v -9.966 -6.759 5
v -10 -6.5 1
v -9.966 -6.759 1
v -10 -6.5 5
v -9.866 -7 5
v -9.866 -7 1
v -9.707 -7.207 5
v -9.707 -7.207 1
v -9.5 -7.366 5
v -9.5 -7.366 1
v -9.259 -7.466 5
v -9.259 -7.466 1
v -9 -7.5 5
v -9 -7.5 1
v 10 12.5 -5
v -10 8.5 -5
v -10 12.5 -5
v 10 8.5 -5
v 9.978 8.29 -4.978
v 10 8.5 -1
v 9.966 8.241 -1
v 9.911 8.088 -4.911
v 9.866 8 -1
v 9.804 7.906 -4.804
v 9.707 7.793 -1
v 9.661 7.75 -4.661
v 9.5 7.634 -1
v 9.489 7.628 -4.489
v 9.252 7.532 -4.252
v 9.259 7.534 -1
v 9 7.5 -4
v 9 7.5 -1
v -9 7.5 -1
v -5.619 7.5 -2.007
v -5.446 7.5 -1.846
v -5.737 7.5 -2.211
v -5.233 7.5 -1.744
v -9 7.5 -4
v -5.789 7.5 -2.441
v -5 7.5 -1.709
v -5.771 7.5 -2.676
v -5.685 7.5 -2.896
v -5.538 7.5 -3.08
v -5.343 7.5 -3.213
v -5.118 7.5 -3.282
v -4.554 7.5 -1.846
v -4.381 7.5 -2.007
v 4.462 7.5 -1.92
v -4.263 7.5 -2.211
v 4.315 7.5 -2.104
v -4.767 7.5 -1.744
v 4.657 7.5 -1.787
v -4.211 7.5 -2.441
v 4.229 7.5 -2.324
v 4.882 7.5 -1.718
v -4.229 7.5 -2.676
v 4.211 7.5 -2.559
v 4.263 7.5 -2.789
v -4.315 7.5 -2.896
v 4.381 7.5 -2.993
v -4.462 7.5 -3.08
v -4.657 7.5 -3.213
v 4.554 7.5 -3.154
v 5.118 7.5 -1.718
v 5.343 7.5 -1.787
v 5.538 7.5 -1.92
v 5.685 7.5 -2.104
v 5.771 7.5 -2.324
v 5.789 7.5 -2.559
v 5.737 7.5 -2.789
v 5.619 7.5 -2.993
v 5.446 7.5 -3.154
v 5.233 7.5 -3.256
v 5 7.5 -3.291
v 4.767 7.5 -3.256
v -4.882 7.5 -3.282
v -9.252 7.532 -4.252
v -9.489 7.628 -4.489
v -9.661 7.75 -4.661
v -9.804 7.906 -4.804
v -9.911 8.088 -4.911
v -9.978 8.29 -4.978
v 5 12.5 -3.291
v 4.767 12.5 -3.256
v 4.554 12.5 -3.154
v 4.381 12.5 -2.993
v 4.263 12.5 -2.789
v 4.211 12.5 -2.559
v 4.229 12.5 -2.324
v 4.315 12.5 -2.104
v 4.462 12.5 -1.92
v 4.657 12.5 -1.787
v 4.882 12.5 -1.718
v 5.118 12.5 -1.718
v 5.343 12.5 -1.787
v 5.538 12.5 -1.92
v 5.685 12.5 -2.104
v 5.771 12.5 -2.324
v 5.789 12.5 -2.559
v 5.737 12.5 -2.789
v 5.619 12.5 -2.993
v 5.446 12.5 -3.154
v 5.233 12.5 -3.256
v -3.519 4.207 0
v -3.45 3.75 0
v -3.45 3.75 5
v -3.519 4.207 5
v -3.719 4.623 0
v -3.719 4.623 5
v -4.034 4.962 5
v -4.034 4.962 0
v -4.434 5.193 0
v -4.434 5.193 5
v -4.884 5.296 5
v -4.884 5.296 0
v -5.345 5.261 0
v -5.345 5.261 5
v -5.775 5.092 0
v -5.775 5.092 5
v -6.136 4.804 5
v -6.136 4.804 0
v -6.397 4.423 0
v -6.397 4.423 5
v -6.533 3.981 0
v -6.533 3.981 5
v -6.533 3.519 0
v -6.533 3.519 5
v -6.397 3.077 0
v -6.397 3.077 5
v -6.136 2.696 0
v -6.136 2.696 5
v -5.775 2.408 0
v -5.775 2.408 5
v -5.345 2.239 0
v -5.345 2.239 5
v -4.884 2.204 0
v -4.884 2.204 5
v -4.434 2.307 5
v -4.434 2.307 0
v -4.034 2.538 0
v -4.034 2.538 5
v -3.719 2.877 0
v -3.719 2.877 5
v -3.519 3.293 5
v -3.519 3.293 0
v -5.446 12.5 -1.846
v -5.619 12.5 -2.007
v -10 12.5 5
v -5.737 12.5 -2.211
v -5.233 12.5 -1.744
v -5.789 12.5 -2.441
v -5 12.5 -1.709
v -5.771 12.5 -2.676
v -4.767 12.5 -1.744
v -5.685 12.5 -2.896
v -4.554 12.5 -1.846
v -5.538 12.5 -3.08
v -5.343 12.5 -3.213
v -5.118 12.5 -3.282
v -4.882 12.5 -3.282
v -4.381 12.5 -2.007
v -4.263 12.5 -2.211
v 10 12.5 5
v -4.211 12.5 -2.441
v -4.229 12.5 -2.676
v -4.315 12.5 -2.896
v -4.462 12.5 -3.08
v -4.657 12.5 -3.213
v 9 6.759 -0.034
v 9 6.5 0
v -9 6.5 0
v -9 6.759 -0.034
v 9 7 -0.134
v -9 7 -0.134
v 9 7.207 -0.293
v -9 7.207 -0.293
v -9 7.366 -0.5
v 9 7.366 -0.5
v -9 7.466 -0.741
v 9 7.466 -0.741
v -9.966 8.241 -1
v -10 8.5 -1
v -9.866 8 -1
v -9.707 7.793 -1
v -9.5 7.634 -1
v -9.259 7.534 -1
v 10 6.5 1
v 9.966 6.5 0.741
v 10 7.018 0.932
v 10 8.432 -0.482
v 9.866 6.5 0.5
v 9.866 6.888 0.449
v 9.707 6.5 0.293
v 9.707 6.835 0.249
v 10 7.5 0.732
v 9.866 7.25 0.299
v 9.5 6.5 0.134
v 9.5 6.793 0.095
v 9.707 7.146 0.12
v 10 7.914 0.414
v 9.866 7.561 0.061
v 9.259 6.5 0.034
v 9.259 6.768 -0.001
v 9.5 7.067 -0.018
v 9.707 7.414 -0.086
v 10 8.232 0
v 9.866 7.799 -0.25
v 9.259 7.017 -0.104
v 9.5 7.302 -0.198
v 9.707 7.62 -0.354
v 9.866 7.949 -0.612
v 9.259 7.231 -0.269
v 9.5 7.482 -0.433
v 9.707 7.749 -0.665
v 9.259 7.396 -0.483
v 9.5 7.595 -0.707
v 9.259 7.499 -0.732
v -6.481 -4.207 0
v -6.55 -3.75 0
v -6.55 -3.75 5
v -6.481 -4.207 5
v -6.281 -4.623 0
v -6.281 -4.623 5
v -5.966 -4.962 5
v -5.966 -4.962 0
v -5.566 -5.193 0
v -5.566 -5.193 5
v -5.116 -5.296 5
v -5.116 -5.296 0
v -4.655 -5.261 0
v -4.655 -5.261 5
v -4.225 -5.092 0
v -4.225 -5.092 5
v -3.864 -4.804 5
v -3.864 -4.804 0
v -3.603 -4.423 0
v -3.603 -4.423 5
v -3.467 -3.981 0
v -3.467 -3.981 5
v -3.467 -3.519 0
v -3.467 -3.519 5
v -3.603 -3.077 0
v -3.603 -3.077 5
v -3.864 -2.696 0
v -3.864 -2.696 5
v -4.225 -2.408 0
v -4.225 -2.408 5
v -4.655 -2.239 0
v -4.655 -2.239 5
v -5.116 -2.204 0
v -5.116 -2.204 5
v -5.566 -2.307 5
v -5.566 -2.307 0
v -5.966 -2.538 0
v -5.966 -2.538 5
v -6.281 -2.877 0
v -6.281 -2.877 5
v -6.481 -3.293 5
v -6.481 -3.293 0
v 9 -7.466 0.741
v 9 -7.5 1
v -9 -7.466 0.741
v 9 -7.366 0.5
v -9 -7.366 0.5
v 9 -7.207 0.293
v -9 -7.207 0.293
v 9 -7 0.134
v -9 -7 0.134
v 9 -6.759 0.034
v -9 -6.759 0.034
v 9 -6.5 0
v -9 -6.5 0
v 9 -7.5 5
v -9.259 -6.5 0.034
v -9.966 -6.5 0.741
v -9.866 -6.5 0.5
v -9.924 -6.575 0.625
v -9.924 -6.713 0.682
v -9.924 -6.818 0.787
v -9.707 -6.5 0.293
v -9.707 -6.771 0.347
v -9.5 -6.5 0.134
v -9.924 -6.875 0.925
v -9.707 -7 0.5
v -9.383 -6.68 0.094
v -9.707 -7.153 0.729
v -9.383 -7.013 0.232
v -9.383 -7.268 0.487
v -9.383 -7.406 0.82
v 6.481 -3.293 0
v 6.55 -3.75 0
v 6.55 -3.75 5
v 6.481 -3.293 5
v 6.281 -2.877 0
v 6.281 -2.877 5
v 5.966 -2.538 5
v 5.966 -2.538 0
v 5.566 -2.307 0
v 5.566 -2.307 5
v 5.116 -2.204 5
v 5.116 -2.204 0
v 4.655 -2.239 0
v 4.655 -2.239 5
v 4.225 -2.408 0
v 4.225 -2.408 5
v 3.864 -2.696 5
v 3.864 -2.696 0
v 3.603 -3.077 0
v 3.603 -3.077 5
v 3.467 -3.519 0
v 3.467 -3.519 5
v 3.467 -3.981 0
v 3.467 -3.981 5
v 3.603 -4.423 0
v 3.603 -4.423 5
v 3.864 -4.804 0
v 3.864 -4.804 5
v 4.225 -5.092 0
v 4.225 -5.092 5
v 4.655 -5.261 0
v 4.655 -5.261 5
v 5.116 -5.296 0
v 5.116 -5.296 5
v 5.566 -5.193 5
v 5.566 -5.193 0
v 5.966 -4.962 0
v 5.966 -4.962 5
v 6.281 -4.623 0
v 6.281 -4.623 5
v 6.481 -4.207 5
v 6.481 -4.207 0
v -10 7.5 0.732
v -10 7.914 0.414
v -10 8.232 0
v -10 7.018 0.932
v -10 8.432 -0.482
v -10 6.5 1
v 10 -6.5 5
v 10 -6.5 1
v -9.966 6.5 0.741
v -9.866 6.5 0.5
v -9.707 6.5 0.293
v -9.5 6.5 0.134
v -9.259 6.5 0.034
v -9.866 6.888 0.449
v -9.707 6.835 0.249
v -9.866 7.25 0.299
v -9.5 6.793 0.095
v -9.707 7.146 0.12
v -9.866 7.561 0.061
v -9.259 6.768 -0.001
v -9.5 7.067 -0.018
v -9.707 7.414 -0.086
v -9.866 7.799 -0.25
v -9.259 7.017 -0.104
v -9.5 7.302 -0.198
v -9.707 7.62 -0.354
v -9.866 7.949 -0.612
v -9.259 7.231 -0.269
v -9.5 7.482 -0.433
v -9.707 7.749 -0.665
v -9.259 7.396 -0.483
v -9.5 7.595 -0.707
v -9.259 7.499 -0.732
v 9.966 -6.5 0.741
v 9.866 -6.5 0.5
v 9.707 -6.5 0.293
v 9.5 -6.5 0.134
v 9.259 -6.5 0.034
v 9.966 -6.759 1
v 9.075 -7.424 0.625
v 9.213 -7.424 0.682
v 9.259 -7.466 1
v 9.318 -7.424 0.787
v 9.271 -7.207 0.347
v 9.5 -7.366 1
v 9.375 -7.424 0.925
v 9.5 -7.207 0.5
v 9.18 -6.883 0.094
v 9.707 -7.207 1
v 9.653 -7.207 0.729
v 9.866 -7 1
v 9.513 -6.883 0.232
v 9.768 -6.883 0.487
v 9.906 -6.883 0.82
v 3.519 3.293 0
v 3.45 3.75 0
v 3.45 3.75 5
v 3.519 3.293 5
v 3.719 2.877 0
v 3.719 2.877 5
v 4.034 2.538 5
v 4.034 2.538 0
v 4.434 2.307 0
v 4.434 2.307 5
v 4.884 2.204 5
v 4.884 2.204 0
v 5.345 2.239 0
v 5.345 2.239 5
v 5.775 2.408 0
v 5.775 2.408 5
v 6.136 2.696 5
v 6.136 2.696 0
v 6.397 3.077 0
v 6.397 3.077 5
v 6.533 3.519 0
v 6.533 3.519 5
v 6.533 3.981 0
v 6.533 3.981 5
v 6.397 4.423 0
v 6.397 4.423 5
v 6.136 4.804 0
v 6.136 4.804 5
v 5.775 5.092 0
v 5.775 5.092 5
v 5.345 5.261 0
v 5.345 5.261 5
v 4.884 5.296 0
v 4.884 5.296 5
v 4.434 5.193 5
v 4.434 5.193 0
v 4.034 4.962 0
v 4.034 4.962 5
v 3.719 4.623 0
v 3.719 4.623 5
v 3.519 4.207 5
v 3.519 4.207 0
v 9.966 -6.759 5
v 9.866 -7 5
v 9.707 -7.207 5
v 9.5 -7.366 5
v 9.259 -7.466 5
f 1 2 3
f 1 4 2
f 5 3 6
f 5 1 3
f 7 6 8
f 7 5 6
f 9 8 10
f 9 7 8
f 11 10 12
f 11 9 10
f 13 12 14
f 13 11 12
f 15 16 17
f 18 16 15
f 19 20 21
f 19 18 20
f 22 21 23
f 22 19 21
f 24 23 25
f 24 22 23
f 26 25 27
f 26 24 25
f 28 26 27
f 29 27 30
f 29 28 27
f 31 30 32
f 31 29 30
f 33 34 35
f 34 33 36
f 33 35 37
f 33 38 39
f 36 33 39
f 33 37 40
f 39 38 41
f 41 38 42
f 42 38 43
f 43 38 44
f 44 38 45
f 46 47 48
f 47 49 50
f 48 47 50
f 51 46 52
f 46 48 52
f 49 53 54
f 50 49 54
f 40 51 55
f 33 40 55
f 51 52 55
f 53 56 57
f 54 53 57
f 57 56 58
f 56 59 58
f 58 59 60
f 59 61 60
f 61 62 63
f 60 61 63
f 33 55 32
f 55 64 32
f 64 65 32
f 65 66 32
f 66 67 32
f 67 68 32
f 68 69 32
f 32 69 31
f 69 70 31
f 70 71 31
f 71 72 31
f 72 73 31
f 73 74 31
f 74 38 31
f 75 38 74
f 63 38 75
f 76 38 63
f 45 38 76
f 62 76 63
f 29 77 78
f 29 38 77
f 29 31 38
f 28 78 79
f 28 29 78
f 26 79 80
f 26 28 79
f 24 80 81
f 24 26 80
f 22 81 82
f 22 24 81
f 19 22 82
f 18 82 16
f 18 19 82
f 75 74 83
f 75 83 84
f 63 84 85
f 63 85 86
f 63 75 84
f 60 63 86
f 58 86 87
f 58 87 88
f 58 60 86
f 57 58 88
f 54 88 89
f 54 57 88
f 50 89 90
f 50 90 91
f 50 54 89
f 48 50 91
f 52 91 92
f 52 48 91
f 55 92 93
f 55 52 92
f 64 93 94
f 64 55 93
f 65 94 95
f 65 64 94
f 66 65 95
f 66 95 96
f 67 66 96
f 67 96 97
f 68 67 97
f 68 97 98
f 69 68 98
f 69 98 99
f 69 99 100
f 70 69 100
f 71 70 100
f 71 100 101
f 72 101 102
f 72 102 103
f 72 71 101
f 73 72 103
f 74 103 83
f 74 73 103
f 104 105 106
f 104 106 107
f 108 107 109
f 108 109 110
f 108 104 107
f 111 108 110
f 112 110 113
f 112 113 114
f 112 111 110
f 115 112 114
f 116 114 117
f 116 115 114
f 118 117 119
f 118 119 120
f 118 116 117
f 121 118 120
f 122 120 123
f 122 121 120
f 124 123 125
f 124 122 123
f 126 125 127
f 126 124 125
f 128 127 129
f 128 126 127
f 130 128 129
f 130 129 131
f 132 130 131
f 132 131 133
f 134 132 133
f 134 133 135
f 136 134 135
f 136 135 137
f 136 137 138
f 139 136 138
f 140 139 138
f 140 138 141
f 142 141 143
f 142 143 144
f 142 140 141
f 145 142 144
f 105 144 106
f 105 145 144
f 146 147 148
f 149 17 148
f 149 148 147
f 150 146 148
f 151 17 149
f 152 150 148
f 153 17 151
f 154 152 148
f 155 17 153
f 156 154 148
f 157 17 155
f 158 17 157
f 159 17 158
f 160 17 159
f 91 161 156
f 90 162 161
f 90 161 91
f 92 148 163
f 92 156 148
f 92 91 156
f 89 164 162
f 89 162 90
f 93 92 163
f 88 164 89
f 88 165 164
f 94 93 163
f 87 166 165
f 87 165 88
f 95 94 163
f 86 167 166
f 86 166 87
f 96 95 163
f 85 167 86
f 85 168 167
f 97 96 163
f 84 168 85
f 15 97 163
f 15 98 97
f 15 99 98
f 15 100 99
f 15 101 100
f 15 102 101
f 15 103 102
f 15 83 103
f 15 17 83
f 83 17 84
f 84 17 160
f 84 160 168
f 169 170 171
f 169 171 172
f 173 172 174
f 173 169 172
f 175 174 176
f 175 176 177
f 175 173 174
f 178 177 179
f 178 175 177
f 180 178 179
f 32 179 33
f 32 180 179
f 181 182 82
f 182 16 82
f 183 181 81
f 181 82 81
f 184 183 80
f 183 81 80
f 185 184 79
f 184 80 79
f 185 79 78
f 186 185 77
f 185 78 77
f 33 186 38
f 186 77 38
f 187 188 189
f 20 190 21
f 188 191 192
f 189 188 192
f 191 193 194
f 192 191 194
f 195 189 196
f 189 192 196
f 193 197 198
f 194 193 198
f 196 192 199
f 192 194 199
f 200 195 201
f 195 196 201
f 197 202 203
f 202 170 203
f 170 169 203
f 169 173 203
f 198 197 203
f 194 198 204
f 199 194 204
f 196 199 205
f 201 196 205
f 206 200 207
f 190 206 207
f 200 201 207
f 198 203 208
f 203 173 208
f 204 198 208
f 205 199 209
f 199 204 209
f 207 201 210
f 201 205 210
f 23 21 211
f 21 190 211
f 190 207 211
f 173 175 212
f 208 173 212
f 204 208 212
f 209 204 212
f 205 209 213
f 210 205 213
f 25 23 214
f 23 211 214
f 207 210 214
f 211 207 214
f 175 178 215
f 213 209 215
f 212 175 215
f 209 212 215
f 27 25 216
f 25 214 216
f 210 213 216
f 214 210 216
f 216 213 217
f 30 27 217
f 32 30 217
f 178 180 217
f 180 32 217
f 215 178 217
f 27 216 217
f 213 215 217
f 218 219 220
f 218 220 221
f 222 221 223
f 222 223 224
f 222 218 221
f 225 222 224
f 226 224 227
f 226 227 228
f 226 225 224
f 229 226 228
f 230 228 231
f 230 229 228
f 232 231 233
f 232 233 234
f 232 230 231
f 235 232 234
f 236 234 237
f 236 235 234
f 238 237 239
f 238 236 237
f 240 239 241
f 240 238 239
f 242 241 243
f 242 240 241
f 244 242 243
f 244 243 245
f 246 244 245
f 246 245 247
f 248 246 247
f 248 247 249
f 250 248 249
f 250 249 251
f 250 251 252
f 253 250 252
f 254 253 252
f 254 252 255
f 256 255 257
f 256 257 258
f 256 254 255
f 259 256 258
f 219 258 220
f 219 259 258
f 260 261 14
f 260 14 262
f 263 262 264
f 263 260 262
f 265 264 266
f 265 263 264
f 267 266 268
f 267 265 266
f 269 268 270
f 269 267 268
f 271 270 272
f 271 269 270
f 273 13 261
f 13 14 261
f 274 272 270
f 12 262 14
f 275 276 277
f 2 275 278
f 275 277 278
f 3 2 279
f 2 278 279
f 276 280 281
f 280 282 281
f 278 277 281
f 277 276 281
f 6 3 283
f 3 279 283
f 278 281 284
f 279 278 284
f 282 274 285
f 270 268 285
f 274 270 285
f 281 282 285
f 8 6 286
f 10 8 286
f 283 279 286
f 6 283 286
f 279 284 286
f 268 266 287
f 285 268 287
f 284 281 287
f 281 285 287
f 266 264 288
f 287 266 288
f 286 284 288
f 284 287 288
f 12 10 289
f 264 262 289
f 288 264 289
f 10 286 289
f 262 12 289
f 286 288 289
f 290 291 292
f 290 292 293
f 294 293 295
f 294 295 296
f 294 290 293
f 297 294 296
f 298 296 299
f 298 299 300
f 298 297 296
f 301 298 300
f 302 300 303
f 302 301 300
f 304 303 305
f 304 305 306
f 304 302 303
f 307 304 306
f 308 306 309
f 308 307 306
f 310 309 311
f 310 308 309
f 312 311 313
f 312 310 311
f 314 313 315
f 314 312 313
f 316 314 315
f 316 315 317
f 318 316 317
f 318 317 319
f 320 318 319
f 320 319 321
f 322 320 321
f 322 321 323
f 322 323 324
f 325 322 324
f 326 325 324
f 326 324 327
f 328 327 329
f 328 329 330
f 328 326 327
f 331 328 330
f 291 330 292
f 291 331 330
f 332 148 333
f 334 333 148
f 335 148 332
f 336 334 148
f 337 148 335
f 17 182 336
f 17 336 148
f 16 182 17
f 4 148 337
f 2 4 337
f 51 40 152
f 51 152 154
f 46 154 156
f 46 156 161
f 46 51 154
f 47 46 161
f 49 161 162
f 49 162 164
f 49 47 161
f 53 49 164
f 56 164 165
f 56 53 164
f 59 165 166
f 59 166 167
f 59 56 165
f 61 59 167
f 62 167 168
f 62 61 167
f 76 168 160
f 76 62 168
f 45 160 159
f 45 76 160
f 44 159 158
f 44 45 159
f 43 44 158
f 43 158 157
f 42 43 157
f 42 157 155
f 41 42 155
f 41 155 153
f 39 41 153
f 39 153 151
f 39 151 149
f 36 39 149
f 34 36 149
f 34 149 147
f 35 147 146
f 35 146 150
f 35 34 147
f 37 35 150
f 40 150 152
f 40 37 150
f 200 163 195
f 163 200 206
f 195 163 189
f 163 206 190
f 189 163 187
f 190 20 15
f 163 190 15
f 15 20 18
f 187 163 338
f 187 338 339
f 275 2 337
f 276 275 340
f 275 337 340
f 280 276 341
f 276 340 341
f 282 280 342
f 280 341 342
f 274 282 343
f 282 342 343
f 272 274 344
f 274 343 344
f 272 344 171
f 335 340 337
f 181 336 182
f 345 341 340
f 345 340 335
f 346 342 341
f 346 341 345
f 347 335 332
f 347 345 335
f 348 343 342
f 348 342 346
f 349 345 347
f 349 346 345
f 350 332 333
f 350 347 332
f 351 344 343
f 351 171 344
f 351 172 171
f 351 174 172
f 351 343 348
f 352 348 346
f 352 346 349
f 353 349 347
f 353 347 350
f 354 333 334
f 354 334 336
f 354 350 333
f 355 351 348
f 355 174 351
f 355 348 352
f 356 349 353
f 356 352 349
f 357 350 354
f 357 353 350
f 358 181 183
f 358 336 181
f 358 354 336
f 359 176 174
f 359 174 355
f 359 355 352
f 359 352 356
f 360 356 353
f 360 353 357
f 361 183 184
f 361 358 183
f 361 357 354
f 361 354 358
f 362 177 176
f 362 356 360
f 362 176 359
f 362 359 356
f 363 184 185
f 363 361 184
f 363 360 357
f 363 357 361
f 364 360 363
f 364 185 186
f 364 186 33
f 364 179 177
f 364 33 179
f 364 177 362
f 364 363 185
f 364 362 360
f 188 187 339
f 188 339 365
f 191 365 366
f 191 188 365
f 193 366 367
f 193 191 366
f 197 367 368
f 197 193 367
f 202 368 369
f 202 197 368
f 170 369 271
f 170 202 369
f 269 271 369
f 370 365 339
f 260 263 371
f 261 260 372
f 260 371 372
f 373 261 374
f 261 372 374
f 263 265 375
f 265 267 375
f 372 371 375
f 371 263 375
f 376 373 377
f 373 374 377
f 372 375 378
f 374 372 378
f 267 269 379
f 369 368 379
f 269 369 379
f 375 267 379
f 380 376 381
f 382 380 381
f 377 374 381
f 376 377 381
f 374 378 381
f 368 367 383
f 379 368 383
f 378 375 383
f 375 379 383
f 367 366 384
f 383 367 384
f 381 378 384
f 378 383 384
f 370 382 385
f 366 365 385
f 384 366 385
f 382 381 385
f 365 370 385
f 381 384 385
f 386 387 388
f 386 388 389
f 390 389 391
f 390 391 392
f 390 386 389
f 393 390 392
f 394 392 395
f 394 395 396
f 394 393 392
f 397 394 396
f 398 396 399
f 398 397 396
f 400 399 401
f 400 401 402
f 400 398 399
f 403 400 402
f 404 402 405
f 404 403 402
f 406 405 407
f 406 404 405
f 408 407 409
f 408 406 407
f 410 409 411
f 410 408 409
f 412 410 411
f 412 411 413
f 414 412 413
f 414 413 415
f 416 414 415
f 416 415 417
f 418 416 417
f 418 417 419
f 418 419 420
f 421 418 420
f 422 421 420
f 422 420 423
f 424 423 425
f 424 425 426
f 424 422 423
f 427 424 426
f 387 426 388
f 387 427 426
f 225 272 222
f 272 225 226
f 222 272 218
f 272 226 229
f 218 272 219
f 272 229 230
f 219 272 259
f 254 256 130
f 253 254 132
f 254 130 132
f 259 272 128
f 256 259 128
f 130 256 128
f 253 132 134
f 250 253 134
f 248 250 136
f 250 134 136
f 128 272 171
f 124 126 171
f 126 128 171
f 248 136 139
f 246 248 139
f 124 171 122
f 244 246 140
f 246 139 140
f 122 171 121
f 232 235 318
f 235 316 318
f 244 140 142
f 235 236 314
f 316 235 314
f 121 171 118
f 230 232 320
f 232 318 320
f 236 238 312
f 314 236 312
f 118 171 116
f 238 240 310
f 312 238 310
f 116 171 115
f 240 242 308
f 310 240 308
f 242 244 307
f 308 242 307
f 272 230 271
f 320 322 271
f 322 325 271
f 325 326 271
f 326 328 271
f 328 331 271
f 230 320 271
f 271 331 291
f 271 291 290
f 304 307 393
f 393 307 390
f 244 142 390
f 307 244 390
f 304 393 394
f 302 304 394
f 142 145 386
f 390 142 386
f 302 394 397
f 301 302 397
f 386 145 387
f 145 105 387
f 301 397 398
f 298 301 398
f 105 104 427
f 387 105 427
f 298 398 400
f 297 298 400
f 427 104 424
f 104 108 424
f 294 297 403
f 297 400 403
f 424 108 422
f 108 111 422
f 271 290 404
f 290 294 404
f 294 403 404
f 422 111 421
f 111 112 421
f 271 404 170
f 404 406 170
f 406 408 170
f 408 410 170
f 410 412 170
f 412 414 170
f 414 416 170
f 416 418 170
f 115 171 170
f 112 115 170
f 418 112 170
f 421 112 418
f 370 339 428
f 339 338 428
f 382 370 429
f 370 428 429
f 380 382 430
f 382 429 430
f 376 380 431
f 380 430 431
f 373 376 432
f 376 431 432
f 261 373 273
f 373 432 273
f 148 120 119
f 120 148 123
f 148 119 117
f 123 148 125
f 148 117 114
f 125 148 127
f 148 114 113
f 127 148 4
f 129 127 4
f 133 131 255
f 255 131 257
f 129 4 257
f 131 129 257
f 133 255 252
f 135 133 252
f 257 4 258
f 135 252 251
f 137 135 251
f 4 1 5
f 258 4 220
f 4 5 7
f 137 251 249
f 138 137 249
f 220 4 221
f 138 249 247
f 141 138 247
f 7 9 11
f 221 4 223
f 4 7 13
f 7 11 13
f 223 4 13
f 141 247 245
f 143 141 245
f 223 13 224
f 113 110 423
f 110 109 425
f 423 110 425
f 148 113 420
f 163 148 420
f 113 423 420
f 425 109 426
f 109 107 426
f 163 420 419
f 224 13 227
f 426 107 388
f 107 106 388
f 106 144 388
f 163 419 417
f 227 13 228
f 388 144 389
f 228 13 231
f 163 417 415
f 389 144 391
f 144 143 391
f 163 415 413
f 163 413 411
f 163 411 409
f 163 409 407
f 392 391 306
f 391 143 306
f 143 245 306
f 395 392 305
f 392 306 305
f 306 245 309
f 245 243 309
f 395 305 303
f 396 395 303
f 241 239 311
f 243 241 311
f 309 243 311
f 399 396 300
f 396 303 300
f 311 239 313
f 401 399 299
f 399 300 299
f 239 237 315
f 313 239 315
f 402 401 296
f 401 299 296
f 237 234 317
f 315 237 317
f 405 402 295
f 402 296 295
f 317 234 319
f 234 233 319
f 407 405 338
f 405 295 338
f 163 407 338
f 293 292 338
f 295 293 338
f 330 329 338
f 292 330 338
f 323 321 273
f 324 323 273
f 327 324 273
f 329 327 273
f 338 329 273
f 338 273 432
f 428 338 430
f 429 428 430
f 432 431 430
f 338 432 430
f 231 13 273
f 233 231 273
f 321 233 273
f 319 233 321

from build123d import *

# Parameters (mm, degrees)
SKETCH1_W           = 20
SKETCH1_H           = 15
SKETCH1_R           = 1.55
BOSS_EXTRUDE1_DEPTH = 5
SKETCH2_W           = 20
SKETCH2_H           = 10
SKETCH2_R           = 0.791259191
BOSS_EXTRUDE2_DEPTH = 5
FILLET1_R           = 1


with BuildPart() as part:
    # Sketch1 → Boss-Extrude1 (new body)
    with BuildSketch(Plane.XY):
        Rectangle(SKETCH1_W, SKETCH1_H)
        with Locations((-5, 3.75)):
            Circle(SKETCH1_R, mode=Mode.SUBTRACT)
        with Locations(Location((5, 3.75, 0), (0, 0, 180))):
            Circle(SKETCH1_R, mode=Mode.SUBTRACT)
        with Locations((5, -3.75)):
            Circle(SKETCH1_R, mode=Mode.SUBTRACT)
        with Locations(Location((-5, -3.75, 0), (0, 0, 180))):
            Circle(SKETCH1_R, mode=Mode.SUBTRACT)
    extrude(amount=BOSS_EXTRUDE1_DEPTH)

    # Sketch2 → Boss-Extrude2 (add)
    with BuildSketch(Plane(origin=(0, 7.5, 0), x_dir=(1, 0, 0), z_dir=(0, 1, 0))):
        Rectangle(SKETCH2_W, SKETCH2_H)
        with Locations(Location((-5, 2.5, 0), (0, 0, 270))):
            Circle(SKETCH2_R, mode=Mode.SUBTRACT)
        with Locations(Location((5, 2.5, 0), (0, 0, 90))):
            Circle(SKETCH2_R, mode=Mode.SUBTRACT)
    extrude(amount=BOSS_EXTRUDE2_DEPTH)

    # Fillet1
    fillet1_edges = [part.edges().sort_by_distance(p)[0] for p in [
        (-10, 7.5, -2.5),
        (10, 7.5, -2.5),
        (0, 7.5, -5),
        (0, 7.5, 0),
        (10, 0, 0),
        (0, -7.5, 0),
        (-10, 0, 0),
        (10, -7.5, 2.5),
        (-10, -7.5, 2.5),
    ]]
    fillet(fillet1_edges, radius=FILLET1_R)


solid = part.part
